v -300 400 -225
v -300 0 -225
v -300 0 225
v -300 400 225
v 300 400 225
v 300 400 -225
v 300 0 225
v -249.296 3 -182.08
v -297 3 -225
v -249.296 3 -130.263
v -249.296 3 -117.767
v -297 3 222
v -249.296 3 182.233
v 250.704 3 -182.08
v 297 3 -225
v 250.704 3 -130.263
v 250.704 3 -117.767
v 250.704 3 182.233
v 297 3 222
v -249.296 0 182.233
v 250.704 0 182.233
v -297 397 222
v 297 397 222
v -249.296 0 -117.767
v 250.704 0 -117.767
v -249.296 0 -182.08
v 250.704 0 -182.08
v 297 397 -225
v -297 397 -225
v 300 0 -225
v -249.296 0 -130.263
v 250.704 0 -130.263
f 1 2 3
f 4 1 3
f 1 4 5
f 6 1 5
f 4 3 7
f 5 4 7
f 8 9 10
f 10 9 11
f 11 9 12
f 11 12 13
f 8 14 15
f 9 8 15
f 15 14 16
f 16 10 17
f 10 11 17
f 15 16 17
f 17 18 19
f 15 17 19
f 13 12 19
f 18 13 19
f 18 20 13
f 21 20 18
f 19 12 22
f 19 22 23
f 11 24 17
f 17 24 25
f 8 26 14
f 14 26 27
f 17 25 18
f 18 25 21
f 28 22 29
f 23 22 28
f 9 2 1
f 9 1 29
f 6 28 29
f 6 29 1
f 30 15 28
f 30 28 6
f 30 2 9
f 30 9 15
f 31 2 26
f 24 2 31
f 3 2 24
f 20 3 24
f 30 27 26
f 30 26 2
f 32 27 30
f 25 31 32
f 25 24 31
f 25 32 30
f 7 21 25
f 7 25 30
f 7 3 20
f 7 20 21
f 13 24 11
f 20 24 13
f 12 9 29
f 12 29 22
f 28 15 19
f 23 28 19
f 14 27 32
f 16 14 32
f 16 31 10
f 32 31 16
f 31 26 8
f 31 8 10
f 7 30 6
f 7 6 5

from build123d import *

# Parameters (mm, degrees)
F0_W     = 600
F0_H     = 450
F0_W_2   = 500
F0_H_2   = 51.817134
F0_H_3   = 300
F1_DEPTH = 400
F2_T     = -3
F3_DEPTH = 3


with BuildPart() as f1:
    # F0 (on Front) → F1 (new body)
    with BuildSketch(Plane.XZ):
        Rectangle(F0_W, F0_H)
        with Locations((0.704244, -156.171255)):
            Rectangle(F0_W_2, F0_H_2, mode=Mode.SUBTRACT)
        with Locations((0.704244, 32.232778)):
            Rectangle(F0_W_2, F0_H_3, mode=Mode.SUBTRACT)
        with Locations((0.704244, 32.232778)):
            Rectangle(F0_W_2, F0_H_3)
        with Locations((0.704244, -156.171255)):
            Rectangle(F0_W_2, F0_H_2)
    extrude(amount=-F1_DEPTH)

    # F2
    f2_openings = [f1.faces().sort_by_distance(p)[0] for p in [
        (0, 200, -225),
    ]]
    offset(amount=F2_T, openings=f2_openings)

    # F0 (on Front) → F3 (cut)
    with BuildSketch(Plane.XZ):
        with Locations((0.704244, 32.232778)):
            Rectangle(F0_W_2, F0_H_3)
        with Locations((0.704244, -156.171255)):
            Rectangle(F0_W_2, F0_H_2)
    extrude(amount=-F3_DEPTH, mode=Mode.SUBTRACT)


solid = f1.part
